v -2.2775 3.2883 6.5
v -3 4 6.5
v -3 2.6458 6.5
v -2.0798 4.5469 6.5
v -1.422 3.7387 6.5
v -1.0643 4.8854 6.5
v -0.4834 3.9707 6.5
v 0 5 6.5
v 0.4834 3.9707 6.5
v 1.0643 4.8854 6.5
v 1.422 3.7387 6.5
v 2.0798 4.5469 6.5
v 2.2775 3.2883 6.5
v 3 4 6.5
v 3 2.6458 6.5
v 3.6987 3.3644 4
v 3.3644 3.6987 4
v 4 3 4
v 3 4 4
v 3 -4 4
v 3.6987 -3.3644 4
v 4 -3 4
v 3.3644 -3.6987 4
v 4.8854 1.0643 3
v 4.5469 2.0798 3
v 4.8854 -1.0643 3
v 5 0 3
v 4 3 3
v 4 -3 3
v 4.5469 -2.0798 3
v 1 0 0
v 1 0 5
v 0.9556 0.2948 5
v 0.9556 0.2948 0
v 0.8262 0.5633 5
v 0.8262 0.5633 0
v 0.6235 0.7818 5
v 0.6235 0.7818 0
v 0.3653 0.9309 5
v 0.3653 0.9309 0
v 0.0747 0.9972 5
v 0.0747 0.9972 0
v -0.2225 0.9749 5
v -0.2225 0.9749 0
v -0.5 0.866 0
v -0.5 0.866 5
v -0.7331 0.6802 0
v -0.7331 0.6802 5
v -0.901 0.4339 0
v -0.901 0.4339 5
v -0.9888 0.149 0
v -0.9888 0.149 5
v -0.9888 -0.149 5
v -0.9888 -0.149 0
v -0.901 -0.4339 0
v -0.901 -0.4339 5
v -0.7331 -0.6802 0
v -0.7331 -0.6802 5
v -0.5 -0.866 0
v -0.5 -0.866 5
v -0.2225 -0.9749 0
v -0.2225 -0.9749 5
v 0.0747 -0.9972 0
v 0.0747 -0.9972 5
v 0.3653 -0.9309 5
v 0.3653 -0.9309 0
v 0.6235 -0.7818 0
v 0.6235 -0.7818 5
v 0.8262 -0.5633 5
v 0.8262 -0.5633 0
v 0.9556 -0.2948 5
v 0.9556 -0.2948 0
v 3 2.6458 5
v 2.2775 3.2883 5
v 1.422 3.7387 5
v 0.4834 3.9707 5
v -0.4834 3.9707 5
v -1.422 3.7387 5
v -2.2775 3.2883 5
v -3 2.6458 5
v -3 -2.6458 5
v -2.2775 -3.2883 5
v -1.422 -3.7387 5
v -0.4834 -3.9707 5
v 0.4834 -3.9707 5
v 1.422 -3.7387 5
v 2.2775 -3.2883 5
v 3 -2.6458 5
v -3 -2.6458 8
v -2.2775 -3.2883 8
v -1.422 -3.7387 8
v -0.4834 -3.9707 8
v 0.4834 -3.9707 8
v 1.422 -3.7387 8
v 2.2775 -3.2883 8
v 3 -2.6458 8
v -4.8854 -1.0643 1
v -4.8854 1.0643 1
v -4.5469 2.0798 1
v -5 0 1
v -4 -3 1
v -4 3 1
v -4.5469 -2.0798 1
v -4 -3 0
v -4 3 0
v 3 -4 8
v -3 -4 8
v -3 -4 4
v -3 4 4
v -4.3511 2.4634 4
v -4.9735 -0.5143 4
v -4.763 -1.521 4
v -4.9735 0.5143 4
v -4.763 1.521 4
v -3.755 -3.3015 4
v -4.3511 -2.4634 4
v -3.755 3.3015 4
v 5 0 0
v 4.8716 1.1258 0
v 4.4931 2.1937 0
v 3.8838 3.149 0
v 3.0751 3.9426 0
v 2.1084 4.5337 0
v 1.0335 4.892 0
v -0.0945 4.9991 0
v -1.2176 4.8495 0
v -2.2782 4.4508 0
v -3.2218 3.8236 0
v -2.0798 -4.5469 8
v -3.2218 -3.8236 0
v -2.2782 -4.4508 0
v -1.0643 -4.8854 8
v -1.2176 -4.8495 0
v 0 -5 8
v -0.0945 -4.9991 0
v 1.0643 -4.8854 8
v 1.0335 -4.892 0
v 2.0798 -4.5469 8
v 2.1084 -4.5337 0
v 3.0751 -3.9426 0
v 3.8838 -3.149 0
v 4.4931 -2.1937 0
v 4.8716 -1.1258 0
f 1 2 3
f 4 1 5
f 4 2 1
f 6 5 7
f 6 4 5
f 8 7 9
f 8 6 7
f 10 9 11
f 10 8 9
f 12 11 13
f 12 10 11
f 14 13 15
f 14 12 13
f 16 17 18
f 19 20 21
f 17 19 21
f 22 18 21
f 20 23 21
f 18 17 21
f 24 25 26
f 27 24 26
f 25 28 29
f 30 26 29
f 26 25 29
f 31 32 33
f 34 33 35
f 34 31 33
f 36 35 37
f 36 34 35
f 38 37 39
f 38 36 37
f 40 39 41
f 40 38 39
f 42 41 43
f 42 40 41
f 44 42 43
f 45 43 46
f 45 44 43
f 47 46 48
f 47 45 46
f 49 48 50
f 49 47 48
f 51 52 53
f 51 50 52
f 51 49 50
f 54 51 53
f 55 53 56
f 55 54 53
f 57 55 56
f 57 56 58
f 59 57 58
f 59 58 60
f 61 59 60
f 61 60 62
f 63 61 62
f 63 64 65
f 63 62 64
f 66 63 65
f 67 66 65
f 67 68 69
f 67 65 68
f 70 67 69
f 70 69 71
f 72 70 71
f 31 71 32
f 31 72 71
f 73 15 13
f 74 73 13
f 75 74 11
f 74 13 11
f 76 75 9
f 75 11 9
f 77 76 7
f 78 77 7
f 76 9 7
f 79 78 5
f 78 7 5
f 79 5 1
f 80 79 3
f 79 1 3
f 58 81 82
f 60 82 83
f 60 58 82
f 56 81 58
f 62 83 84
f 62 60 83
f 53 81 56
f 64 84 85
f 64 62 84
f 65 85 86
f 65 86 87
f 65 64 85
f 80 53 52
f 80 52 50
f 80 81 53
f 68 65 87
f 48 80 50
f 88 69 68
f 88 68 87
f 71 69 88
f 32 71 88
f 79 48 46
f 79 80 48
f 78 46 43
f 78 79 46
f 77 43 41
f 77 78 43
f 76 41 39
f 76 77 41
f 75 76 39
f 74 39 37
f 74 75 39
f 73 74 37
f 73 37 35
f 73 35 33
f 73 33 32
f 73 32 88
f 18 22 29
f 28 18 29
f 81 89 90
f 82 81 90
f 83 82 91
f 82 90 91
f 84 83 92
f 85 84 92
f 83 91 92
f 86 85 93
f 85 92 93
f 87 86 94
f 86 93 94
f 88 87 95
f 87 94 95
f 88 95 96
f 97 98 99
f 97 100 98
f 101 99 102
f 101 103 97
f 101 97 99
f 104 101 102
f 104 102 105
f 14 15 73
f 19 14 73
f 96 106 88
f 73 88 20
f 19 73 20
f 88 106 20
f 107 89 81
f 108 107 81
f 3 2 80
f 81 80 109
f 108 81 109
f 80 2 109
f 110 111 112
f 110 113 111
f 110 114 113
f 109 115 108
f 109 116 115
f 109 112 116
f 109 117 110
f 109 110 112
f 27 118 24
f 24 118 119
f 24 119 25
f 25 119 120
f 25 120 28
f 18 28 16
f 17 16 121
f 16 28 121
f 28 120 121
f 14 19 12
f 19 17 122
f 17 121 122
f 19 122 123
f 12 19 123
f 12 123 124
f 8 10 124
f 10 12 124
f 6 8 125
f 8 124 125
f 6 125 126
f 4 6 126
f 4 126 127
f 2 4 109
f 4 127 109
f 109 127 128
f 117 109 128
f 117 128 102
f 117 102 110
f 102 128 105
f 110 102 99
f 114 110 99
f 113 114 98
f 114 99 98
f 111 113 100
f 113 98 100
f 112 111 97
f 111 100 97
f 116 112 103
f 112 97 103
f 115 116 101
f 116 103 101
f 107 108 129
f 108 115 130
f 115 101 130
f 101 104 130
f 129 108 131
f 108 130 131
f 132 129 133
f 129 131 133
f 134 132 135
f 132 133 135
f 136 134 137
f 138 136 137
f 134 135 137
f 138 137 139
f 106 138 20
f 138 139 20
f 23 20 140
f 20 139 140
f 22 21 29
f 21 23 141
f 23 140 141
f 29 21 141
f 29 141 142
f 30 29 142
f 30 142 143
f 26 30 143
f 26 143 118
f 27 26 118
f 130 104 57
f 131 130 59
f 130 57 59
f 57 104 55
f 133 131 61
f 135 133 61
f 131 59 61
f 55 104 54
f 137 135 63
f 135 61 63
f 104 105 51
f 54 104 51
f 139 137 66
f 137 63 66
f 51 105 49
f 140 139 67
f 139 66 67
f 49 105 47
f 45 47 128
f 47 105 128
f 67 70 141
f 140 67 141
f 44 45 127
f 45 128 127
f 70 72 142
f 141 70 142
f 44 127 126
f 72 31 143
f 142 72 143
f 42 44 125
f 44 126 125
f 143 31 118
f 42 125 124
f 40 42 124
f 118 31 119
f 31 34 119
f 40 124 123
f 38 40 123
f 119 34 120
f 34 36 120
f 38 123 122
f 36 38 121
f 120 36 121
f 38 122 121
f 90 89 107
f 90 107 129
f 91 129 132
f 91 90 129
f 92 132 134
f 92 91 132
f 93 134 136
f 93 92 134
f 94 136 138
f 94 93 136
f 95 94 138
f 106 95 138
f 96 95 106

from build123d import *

# Parameters (mm, degrees)
SKETCH2_R           = 5
SKETCH2_R_2         = 1
BOSS_EXTRUDE1_DEPTH = 8
SKETCH3_W           = 1
SKETCH3_H           = 1
SKETCH3_W_2         = 2
SKETCH3_H_2         = 4
CUT_EXTRUDE1_DEPTH  = 4
SKETCH4_R           = 4
CUT_EXTRUDE2_DEPTH  = 3
SKETCH5_W           = 9.370112771
SKETCH5_H           = 5.033531654
CUT_EXTRUDE3_DEPTH  = 1.5


with BuildPart() as part:
    # Sketch2 → Boss-Extrude1 (new body)
    with BuildSketch(Plane.XY):
        Circle(SKETCH2_R)
        Circle(SKETCH2_R_2, mode=Mode.SUBTRACT)
    extrude(amount=BOSS_EXTRUDE1_DEPTH)

    # Sketch3 → Cut-Extrude1 (cut, symmetric)
    with BuildSketch(Plane(origin=(0, 0, 0), x_dir=(1, 0, 0), z_dir=(0, 1, 0))):
        with Locations((-4.5, -0.5)):
            Rectangle(SKETCH3_W, SKETCH3_H)
        Polygon((5, -8), (3, -8), (3, -4), (4, -4), (4, -3), (5, -3), align=None)
        with Locations((-4, -6)):
            Rectangle(SKETCH3_W_2, SKETCH3_H_2)
    extrude(amount=CUT_EXTRUDE1_DEPTH, both=True, mode=Mode.SUBTRACT)

    # Sketch4 → Cut-Extrude2 (cut)
    with BuildSketch(Plane.XY.offset(8)):
        Circle(SKETCH4_R)
    extrude(amount=-CUT_EXTRUDE2_DEPTH, mode=Mode.SUBTRACT)

    # Sketch5 → Cut-Extrude3 (cut)
    with BuildSketch(Plane.XY.offset(8)):
        with Locations((0.643727428, 3.756174823)):
            Rectangle(SKETCH5_W, SKETCH5_H)
    extrude(amount=-CUT_EXTRUDE3_DEPTH, mode=Mode.SUBTRACT)


solid = part.part
